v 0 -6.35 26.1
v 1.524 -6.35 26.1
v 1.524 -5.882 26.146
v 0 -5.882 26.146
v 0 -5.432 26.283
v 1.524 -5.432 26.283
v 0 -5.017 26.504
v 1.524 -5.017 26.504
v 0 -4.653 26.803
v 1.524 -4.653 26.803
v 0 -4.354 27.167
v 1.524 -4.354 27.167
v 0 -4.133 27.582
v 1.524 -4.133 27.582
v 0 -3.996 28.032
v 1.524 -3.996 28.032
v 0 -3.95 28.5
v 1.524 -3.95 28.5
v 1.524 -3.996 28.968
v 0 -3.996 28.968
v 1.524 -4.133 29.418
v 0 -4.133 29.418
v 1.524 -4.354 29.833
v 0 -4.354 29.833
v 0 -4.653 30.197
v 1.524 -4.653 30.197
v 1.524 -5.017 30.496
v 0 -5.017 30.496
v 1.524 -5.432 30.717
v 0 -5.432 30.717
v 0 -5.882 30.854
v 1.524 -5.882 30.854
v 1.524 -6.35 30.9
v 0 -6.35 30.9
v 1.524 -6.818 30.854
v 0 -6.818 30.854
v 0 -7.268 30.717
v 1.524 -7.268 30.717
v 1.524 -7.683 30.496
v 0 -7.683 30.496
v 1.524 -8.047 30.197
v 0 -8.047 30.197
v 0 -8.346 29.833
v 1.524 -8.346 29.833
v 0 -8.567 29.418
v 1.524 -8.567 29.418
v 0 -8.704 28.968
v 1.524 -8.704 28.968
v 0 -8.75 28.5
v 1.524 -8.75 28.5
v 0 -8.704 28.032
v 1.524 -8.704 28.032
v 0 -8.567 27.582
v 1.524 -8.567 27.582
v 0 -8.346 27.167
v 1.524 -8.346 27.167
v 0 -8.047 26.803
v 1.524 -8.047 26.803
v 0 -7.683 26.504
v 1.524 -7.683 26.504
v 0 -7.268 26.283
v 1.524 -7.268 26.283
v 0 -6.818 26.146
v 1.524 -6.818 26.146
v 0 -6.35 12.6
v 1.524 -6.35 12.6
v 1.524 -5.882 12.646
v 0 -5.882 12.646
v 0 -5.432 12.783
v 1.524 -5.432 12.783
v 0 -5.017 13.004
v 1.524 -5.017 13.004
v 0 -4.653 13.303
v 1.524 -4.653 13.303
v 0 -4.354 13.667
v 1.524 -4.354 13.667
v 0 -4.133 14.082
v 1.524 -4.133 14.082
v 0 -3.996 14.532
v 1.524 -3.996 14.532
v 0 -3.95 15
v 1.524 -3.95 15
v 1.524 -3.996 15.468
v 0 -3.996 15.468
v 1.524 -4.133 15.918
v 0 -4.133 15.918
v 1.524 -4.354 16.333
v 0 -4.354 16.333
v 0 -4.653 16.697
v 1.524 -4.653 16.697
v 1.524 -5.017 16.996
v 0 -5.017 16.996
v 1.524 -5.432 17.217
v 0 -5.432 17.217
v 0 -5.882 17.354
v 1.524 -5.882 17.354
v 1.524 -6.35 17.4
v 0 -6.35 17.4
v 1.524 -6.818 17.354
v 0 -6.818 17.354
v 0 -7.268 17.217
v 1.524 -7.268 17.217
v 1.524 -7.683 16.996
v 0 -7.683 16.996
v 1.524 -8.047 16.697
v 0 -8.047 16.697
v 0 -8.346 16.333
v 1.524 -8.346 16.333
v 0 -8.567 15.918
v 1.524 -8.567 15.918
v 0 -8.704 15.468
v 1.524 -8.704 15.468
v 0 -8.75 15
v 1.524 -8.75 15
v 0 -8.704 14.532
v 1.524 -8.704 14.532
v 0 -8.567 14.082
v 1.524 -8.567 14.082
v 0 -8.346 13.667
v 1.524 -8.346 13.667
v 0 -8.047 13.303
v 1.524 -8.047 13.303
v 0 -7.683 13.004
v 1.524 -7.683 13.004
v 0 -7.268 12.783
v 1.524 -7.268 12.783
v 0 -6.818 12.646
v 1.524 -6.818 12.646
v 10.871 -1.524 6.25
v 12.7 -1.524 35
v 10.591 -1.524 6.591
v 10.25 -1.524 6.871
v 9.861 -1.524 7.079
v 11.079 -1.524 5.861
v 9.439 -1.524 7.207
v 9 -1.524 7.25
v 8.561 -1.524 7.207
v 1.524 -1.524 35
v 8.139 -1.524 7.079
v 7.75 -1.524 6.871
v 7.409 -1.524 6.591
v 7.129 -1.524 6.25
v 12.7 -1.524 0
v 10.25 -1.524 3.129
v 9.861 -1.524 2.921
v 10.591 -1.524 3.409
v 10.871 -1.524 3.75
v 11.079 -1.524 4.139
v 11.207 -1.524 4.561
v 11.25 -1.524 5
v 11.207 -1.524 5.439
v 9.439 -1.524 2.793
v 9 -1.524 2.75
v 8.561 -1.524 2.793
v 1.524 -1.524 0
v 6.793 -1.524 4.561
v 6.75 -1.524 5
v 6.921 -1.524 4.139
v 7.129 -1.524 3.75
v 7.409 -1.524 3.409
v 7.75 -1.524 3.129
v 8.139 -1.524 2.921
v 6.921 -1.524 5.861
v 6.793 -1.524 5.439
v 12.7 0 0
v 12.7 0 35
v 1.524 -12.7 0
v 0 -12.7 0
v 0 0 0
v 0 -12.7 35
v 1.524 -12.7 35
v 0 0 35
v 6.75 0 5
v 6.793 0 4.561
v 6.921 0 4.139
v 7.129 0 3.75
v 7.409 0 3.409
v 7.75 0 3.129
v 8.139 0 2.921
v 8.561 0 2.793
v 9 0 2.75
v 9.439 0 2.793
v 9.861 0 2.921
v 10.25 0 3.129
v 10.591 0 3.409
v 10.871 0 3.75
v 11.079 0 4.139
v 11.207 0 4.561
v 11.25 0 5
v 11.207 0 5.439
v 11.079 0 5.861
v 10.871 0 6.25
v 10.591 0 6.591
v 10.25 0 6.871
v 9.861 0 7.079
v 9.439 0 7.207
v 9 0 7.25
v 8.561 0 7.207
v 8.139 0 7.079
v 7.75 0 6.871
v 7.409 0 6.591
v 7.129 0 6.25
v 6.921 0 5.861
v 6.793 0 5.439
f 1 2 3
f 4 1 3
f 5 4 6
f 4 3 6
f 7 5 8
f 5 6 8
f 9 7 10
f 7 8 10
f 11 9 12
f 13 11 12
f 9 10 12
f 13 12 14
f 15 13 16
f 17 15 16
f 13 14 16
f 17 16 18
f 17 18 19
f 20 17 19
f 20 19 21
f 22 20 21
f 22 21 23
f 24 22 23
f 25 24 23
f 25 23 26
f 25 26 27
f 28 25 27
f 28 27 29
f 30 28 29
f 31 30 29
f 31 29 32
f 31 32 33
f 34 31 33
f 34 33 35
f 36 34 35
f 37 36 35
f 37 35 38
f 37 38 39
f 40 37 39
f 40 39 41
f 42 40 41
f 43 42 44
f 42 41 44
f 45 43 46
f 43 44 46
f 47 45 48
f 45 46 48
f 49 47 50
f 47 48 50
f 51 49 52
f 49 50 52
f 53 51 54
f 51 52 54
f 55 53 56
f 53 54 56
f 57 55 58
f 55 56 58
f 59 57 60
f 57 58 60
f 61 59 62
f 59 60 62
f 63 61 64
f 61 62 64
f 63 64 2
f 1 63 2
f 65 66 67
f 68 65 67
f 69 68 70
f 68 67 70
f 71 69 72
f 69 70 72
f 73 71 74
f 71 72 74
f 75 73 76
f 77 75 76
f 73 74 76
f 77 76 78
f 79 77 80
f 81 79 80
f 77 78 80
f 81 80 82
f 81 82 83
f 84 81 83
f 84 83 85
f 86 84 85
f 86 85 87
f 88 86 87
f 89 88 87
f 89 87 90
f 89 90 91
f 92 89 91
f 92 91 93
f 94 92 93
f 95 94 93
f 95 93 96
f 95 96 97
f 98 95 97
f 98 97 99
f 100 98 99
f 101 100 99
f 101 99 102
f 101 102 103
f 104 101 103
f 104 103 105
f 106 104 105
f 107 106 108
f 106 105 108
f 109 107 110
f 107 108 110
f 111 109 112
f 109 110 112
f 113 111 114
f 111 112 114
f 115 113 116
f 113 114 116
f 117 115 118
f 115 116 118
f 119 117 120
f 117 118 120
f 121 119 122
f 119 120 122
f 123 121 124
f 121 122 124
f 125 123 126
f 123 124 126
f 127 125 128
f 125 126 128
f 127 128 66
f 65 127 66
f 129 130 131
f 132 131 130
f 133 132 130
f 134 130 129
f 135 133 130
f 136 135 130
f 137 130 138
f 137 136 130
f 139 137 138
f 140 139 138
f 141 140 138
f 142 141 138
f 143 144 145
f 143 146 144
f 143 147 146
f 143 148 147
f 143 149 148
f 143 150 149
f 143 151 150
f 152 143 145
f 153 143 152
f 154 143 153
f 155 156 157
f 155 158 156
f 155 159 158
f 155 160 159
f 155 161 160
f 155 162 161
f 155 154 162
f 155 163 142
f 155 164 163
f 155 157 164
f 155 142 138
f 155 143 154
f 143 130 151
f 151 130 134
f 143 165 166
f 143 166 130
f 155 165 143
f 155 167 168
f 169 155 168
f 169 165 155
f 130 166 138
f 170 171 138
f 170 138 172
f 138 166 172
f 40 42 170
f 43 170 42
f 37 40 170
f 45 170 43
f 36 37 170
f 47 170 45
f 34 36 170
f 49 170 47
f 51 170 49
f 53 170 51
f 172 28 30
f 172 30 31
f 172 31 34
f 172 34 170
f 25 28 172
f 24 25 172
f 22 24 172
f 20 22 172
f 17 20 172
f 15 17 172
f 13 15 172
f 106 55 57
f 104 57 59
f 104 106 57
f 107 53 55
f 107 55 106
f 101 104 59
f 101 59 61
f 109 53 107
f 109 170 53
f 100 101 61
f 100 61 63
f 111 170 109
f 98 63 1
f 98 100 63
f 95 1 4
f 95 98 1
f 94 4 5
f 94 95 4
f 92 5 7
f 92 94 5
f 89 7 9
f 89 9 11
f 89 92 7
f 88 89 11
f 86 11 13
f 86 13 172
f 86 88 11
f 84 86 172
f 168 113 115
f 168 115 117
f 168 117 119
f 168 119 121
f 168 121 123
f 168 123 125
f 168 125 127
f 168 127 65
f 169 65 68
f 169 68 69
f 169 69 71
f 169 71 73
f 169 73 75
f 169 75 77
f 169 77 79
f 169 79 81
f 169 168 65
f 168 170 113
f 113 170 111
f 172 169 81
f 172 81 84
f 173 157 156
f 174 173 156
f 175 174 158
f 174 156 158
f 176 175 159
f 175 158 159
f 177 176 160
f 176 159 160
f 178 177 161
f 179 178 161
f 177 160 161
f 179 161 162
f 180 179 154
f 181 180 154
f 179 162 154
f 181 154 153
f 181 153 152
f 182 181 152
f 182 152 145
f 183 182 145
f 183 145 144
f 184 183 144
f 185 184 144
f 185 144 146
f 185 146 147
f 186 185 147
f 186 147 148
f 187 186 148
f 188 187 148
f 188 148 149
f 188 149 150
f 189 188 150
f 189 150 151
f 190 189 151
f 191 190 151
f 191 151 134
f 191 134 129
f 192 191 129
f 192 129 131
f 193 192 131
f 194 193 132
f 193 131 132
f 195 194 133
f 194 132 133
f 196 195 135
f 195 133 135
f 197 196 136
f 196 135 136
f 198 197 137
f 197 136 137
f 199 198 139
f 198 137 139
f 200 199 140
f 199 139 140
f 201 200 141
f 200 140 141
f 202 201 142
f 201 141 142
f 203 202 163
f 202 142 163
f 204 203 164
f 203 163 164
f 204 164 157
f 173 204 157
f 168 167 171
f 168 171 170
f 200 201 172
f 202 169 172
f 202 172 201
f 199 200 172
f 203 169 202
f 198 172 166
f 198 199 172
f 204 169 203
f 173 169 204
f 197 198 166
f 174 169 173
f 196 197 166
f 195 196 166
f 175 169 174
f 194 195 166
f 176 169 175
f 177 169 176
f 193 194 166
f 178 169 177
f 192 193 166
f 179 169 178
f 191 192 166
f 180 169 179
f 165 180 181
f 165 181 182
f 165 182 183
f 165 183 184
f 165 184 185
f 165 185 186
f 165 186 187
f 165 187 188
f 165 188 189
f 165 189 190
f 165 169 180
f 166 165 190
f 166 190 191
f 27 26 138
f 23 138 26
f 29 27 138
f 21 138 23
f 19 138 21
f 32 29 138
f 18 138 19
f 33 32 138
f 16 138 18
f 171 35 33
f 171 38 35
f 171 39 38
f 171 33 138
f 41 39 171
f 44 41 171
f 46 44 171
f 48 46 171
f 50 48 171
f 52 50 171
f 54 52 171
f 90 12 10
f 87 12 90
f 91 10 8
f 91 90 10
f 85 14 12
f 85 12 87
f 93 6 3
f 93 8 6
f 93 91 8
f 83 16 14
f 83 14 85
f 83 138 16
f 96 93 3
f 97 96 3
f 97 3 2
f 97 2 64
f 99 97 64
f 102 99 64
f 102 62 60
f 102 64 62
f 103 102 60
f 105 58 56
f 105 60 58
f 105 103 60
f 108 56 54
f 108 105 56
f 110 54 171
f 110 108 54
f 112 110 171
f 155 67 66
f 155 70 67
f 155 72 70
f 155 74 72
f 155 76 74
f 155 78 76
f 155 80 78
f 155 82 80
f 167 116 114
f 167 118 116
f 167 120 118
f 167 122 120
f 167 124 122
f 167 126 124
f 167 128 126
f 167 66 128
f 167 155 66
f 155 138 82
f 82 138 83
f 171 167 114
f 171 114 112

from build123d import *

# Parameters (mm, degrees)
BOSS_EXTRUDE1_DEPTH  = 35
M4_CLEARANCE_HOLE1_D = 4.5
M4_CLEARANCE_HOLE2_D = 4.8


with BuildPart() as part:
    # Sketch1 → Boss-Extrude1 (new body)
    with BuildSketch(Plane.XY):
        Polygon((0, 0), (12.7, 0), (12.7, -1.524), (1.524, -1.524), (1.524, -12.7), (0, -12.7), align=None)
    extrude(amount=BOSS_EXTRUDE1_DEPTH)

    # M4 Clearance Hole1 (through all)
    with Locations(Plane(origin=(0, 0, 0), x_dir=(1, 0, 0), z_dir=(0, 1, 0))):
        with Locations((9, -5)):
            Hole(M4_CLEARANCE_HOLE1_D / 2)

    # M4 Clearance Hole2 (through all)
    with Locations(Plane.ZY):
        with Locations((15, -6.35), (28.5, -6.35)):
            Hole(M4_CLEARANCE_HOLE2_D / 2)


solid = part.part
